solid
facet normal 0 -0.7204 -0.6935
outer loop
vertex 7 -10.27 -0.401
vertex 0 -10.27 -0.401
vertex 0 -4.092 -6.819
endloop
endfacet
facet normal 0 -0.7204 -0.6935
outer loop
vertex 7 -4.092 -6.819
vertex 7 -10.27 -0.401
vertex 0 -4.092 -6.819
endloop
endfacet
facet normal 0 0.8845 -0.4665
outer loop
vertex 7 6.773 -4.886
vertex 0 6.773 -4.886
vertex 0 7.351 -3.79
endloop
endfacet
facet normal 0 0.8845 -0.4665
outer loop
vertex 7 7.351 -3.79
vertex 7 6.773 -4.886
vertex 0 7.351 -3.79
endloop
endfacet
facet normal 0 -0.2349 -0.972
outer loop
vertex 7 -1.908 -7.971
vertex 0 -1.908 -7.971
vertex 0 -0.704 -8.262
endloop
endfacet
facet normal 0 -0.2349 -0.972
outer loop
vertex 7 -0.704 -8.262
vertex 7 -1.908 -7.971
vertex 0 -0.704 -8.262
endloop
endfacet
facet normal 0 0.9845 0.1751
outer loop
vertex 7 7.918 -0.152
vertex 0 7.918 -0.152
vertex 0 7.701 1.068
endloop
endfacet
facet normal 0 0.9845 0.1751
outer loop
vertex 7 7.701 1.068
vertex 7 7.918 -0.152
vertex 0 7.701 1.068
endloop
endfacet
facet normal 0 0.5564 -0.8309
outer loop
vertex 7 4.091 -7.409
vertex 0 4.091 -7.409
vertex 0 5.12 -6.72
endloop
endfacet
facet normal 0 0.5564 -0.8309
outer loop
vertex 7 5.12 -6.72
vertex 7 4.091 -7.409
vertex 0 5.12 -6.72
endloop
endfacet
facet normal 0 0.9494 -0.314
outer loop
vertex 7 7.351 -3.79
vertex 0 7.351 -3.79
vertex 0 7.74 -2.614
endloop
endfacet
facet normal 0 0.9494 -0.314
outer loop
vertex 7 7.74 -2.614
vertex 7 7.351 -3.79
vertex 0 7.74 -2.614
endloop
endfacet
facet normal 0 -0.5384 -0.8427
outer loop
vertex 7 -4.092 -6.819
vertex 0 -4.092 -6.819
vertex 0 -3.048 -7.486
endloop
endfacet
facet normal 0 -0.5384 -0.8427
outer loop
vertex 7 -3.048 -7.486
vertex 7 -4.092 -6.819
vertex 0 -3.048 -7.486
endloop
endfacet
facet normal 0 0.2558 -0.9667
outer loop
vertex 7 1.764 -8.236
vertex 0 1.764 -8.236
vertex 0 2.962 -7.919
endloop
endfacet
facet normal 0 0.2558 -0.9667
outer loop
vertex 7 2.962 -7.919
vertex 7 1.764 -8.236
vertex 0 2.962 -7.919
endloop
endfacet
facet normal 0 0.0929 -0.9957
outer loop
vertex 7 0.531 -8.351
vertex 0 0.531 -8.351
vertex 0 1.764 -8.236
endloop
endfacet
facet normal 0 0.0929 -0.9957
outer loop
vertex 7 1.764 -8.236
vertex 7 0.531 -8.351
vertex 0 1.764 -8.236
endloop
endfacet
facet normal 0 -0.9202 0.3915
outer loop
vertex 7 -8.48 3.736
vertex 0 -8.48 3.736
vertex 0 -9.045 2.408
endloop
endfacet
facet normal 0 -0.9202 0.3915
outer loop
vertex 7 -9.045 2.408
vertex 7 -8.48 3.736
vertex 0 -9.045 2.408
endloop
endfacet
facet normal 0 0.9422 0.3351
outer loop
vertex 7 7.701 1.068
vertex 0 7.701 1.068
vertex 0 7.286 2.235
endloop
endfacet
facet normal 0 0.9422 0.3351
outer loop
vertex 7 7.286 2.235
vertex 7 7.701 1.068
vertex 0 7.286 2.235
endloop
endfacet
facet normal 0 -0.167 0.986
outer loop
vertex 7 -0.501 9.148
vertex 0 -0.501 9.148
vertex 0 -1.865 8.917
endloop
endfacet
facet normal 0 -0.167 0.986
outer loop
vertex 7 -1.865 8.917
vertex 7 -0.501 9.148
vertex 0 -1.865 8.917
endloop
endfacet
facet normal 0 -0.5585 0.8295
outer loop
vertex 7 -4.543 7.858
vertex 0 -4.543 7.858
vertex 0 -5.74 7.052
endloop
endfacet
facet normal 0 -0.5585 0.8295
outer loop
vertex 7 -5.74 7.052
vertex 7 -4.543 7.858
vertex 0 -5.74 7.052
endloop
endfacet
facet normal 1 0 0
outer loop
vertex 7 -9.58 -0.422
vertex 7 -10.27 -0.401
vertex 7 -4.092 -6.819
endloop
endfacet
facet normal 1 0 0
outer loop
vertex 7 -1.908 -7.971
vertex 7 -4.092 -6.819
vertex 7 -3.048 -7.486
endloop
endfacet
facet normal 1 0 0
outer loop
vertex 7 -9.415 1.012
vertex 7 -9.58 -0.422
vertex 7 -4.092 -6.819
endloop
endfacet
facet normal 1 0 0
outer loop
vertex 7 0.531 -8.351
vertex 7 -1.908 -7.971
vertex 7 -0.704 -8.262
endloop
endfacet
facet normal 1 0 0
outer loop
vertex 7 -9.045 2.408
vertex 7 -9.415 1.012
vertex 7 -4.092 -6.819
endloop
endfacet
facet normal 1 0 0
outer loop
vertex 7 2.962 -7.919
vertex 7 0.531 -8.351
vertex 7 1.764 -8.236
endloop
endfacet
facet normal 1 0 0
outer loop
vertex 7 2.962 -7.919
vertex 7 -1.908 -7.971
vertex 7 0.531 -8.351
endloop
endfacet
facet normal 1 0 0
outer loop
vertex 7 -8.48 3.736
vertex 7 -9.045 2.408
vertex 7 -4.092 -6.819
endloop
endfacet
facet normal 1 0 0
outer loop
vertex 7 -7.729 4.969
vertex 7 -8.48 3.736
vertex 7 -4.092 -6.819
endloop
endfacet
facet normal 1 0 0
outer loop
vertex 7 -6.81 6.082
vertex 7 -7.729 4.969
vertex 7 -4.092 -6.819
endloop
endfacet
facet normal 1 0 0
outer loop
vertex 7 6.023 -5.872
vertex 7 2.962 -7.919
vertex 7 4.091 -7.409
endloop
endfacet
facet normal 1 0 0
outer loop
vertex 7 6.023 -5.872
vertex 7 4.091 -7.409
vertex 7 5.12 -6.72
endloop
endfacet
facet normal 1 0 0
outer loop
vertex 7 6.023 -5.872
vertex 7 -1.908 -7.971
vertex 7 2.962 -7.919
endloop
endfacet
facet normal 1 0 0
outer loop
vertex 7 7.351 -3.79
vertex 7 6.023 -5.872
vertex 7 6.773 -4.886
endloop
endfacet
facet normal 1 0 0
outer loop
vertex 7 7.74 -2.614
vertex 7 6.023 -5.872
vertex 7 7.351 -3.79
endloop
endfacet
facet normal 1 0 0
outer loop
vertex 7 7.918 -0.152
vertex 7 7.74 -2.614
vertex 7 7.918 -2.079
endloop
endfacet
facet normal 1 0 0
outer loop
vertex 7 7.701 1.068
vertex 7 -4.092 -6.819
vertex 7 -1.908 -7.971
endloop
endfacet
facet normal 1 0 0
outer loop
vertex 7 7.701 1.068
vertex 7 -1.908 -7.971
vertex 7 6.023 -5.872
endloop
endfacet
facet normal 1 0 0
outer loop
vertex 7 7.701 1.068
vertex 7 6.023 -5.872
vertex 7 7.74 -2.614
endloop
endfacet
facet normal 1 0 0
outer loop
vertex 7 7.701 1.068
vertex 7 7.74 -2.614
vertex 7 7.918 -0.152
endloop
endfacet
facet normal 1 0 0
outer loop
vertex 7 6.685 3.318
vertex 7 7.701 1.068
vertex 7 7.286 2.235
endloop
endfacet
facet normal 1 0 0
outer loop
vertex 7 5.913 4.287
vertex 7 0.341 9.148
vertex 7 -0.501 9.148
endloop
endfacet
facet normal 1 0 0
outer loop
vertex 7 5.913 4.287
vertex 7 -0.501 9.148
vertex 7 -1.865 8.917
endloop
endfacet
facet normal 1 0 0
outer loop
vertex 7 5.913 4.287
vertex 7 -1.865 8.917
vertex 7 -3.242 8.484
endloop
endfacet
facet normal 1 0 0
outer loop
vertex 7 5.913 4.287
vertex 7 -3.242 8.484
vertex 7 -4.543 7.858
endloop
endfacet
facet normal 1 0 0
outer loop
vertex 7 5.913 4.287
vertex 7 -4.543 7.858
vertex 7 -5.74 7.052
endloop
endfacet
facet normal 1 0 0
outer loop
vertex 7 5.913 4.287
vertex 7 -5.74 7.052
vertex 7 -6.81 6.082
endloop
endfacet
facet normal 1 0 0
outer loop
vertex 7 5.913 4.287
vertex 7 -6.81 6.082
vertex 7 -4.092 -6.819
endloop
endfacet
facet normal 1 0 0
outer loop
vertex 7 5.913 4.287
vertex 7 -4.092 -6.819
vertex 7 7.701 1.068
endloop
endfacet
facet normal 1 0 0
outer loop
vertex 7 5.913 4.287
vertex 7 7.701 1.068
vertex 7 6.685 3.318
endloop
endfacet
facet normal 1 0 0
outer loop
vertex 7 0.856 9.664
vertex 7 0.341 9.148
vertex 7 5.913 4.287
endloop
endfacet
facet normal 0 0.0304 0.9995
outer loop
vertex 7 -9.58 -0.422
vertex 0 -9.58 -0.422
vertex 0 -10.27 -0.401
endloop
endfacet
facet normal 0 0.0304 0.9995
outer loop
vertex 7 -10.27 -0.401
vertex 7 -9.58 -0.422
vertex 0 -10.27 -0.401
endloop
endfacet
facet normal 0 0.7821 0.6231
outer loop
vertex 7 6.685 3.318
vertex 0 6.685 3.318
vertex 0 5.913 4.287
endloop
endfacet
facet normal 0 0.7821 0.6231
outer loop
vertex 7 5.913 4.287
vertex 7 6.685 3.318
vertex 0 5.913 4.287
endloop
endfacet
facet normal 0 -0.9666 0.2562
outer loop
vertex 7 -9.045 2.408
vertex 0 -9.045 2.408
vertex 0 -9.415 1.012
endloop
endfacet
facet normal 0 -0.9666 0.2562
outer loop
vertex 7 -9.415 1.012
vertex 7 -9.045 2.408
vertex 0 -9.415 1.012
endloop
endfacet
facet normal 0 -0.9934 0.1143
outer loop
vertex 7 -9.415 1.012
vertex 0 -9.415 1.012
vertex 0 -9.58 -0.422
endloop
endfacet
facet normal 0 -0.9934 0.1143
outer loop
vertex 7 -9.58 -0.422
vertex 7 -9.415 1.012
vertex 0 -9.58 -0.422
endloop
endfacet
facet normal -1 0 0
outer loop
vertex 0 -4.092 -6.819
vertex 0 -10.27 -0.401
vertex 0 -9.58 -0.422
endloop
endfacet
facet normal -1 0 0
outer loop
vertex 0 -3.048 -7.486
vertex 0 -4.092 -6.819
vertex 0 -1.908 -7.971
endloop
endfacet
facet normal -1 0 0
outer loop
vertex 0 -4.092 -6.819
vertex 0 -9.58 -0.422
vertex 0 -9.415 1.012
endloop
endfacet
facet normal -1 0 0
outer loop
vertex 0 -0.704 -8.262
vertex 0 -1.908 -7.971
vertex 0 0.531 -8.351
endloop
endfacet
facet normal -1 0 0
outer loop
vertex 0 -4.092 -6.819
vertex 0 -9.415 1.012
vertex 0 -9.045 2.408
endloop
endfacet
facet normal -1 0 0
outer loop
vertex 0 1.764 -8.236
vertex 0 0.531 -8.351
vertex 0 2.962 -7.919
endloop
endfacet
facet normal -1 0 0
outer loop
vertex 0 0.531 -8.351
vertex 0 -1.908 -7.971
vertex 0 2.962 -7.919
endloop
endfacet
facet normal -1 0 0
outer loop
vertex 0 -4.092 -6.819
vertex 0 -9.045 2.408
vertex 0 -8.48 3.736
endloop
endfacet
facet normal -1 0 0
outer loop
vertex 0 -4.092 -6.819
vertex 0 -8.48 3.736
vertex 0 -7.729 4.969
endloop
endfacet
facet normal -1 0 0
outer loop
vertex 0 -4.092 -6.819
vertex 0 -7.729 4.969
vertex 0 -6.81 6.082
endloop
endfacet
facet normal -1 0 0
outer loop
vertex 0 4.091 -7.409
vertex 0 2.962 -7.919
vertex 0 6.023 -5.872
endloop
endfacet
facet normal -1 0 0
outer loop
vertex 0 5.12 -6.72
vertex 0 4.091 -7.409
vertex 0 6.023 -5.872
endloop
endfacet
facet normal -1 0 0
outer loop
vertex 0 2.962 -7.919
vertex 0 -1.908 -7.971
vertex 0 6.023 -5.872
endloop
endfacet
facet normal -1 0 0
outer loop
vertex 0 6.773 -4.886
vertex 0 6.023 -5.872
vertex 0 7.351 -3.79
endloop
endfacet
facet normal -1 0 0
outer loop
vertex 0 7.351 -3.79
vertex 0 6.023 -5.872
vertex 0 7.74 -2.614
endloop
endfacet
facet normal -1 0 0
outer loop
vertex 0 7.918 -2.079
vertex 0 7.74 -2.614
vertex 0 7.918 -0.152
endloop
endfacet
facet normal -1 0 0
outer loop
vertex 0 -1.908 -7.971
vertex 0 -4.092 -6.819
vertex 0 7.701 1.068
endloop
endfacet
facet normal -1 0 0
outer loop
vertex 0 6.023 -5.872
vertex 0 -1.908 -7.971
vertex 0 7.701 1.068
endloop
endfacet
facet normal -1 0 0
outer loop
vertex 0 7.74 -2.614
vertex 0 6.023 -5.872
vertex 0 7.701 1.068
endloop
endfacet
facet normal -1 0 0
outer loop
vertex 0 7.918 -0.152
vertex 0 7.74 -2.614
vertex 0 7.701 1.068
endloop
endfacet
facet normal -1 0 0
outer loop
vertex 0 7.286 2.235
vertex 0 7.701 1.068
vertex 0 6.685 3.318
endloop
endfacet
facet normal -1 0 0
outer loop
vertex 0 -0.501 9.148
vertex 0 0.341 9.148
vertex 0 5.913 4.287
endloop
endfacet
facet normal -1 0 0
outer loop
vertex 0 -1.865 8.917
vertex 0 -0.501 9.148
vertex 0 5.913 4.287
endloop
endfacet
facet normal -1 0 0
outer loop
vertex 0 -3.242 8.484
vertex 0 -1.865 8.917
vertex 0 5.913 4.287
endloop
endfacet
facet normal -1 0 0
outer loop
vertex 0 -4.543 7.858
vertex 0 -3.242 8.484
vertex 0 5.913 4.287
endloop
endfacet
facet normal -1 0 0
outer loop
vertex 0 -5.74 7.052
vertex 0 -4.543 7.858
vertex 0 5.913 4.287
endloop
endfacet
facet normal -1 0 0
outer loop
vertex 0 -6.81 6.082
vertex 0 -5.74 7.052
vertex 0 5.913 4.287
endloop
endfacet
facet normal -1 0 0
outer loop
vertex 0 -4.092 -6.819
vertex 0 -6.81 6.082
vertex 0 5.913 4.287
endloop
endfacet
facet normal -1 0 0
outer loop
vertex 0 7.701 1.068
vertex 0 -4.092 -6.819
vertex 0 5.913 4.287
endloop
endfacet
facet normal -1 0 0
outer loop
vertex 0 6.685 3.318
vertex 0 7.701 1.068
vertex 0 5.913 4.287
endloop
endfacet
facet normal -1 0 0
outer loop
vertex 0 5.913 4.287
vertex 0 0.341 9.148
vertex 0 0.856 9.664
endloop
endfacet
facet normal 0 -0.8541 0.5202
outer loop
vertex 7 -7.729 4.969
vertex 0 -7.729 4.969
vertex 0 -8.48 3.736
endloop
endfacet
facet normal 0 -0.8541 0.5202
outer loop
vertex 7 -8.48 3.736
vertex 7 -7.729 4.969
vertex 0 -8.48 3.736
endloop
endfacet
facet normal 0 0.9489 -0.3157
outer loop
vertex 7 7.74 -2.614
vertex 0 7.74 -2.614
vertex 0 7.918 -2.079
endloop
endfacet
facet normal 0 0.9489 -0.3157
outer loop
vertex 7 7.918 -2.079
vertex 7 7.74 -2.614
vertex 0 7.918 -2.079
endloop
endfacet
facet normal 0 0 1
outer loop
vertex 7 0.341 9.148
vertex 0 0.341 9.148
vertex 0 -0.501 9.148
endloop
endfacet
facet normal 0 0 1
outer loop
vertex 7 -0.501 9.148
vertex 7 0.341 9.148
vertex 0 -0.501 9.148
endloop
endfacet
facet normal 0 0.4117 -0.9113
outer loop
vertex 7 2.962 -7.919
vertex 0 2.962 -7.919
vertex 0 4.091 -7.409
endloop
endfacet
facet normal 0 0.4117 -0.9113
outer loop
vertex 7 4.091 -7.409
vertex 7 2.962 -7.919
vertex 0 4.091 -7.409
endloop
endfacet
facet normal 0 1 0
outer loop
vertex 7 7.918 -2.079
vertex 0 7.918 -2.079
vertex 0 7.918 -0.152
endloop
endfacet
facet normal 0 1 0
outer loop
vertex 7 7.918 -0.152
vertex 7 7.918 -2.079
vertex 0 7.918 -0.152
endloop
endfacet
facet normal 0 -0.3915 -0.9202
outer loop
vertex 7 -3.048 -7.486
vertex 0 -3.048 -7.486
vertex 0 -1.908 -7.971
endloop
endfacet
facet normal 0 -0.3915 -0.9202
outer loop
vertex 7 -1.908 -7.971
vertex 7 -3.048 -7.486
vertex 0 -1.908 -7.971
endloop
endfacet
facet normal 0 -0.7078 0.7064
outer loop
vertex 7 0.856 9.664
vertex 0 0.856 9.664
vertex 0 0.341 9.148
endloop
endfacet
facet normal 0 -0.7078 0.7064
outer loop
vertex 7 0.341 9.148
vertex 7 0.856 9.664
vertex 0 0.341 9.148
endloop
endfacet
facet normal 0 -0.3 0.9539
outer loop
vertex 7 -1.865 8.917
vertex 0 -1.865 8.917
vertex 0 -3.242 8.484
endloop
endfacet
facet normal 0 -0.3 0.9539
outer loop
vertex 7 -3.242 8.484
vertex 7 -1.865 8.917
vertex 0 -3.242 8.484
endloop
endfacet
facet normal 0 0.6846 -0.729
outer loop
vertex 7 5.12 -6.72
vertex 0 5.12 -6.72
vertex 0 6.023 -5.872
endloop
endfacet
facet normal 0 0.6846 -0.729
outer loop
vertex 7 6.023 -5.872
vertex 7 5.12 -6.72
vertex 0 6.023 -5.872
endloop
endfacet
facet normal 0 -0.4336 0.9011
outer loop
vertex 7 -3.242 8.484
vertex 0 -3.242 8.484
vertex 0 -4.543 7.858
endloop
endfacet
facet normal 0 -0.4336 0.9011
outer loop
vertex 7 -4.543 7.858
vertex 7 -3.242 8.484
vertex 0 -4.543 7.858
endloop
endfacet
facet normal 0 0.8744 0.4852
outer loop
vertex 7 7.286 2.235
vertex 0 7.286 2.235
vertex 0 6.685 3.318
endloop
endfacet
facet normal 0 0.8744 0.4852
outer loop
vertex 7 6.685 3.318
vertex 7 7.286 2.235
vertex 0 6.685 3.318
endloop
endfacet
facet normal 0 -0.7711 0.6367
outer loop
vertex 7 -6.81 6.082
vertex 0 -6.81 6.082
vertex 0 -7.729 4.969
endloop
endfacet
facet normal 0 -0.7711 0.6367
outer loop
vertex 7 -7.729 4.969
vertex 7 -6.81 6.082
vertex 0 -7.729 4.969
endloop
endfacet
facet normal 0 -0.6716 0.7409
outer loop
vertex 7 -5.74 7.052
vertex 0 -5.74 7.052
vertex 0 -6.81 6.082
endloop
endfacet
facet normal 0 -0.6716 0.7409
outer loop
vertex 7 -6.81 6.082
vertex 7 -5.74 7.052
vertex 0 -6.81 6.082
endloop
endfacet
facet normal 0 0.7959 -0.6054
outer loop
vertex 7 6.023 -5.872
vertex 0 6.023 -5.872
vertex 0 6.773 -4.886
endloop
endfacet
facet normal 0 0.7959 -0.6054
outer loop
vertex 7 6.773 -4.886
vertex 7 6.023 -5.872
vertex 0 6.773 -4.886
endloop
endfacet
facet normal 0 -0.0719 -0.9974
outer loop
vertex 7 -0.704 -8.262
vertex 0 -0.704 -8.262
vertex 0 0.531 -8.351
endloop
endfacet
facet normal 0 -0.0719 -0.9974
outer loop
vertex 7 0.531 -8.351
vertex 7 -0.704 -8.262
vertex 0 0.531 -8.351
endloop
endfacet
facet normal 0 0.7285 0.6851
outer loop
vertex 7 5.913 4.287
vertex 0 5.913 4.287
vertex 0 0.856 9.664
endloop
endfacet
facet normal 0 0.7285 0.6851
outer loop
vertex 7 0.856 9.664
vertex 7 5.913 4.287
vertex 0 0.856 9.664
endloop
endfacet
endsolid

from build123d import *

# Parameters (mm, degrees)
F1_DEPTH = 7


with BuildPart() as f1:
    # F0 (on Right) → F1 (new body)
    with BuildSketch(Plane.YZ):
        Polygon((-10.270449, -0.400699), (-4.092179, -6.819432), (-3.047954, -7.485725), (-1.908302, -7.971057), (-0.704311, -8.262191), (0.531178, -8.351182), (1.764465, -8.235605), (2.961906, -7.918611), (4.090843, -7.408849), (5.120478, -6.720222), (6.022723, -5.871515), (6.772974, -4.88588), (7.350761, -3.790199), (7.740323, -2.614362), (7.917699, -2.078977), (7.917699, -0.151823), (7.700671, 1.067708), (7.285879, 2.234883), (6.684631, 3.317867), (5.913329, 4.287119), (0.855827, 9.663673), (0.340538, 9.148384), (-0.500703, 9.148384), (-1.864732, 8.917333), (-3.241889, 8.484291), (-4.542701, 7.858209), (-5.74027, 7.052034), (-6.809833, 6.082434), (-7.729276, 4.969459), (-8.479586, 3.736121), (-9.045251, 2.407921), (-9.414573, 1.012325), (-9.579916, -0.421813), align=None)
    extrude(amount=F1_DEPTH)


solid = f1.part
